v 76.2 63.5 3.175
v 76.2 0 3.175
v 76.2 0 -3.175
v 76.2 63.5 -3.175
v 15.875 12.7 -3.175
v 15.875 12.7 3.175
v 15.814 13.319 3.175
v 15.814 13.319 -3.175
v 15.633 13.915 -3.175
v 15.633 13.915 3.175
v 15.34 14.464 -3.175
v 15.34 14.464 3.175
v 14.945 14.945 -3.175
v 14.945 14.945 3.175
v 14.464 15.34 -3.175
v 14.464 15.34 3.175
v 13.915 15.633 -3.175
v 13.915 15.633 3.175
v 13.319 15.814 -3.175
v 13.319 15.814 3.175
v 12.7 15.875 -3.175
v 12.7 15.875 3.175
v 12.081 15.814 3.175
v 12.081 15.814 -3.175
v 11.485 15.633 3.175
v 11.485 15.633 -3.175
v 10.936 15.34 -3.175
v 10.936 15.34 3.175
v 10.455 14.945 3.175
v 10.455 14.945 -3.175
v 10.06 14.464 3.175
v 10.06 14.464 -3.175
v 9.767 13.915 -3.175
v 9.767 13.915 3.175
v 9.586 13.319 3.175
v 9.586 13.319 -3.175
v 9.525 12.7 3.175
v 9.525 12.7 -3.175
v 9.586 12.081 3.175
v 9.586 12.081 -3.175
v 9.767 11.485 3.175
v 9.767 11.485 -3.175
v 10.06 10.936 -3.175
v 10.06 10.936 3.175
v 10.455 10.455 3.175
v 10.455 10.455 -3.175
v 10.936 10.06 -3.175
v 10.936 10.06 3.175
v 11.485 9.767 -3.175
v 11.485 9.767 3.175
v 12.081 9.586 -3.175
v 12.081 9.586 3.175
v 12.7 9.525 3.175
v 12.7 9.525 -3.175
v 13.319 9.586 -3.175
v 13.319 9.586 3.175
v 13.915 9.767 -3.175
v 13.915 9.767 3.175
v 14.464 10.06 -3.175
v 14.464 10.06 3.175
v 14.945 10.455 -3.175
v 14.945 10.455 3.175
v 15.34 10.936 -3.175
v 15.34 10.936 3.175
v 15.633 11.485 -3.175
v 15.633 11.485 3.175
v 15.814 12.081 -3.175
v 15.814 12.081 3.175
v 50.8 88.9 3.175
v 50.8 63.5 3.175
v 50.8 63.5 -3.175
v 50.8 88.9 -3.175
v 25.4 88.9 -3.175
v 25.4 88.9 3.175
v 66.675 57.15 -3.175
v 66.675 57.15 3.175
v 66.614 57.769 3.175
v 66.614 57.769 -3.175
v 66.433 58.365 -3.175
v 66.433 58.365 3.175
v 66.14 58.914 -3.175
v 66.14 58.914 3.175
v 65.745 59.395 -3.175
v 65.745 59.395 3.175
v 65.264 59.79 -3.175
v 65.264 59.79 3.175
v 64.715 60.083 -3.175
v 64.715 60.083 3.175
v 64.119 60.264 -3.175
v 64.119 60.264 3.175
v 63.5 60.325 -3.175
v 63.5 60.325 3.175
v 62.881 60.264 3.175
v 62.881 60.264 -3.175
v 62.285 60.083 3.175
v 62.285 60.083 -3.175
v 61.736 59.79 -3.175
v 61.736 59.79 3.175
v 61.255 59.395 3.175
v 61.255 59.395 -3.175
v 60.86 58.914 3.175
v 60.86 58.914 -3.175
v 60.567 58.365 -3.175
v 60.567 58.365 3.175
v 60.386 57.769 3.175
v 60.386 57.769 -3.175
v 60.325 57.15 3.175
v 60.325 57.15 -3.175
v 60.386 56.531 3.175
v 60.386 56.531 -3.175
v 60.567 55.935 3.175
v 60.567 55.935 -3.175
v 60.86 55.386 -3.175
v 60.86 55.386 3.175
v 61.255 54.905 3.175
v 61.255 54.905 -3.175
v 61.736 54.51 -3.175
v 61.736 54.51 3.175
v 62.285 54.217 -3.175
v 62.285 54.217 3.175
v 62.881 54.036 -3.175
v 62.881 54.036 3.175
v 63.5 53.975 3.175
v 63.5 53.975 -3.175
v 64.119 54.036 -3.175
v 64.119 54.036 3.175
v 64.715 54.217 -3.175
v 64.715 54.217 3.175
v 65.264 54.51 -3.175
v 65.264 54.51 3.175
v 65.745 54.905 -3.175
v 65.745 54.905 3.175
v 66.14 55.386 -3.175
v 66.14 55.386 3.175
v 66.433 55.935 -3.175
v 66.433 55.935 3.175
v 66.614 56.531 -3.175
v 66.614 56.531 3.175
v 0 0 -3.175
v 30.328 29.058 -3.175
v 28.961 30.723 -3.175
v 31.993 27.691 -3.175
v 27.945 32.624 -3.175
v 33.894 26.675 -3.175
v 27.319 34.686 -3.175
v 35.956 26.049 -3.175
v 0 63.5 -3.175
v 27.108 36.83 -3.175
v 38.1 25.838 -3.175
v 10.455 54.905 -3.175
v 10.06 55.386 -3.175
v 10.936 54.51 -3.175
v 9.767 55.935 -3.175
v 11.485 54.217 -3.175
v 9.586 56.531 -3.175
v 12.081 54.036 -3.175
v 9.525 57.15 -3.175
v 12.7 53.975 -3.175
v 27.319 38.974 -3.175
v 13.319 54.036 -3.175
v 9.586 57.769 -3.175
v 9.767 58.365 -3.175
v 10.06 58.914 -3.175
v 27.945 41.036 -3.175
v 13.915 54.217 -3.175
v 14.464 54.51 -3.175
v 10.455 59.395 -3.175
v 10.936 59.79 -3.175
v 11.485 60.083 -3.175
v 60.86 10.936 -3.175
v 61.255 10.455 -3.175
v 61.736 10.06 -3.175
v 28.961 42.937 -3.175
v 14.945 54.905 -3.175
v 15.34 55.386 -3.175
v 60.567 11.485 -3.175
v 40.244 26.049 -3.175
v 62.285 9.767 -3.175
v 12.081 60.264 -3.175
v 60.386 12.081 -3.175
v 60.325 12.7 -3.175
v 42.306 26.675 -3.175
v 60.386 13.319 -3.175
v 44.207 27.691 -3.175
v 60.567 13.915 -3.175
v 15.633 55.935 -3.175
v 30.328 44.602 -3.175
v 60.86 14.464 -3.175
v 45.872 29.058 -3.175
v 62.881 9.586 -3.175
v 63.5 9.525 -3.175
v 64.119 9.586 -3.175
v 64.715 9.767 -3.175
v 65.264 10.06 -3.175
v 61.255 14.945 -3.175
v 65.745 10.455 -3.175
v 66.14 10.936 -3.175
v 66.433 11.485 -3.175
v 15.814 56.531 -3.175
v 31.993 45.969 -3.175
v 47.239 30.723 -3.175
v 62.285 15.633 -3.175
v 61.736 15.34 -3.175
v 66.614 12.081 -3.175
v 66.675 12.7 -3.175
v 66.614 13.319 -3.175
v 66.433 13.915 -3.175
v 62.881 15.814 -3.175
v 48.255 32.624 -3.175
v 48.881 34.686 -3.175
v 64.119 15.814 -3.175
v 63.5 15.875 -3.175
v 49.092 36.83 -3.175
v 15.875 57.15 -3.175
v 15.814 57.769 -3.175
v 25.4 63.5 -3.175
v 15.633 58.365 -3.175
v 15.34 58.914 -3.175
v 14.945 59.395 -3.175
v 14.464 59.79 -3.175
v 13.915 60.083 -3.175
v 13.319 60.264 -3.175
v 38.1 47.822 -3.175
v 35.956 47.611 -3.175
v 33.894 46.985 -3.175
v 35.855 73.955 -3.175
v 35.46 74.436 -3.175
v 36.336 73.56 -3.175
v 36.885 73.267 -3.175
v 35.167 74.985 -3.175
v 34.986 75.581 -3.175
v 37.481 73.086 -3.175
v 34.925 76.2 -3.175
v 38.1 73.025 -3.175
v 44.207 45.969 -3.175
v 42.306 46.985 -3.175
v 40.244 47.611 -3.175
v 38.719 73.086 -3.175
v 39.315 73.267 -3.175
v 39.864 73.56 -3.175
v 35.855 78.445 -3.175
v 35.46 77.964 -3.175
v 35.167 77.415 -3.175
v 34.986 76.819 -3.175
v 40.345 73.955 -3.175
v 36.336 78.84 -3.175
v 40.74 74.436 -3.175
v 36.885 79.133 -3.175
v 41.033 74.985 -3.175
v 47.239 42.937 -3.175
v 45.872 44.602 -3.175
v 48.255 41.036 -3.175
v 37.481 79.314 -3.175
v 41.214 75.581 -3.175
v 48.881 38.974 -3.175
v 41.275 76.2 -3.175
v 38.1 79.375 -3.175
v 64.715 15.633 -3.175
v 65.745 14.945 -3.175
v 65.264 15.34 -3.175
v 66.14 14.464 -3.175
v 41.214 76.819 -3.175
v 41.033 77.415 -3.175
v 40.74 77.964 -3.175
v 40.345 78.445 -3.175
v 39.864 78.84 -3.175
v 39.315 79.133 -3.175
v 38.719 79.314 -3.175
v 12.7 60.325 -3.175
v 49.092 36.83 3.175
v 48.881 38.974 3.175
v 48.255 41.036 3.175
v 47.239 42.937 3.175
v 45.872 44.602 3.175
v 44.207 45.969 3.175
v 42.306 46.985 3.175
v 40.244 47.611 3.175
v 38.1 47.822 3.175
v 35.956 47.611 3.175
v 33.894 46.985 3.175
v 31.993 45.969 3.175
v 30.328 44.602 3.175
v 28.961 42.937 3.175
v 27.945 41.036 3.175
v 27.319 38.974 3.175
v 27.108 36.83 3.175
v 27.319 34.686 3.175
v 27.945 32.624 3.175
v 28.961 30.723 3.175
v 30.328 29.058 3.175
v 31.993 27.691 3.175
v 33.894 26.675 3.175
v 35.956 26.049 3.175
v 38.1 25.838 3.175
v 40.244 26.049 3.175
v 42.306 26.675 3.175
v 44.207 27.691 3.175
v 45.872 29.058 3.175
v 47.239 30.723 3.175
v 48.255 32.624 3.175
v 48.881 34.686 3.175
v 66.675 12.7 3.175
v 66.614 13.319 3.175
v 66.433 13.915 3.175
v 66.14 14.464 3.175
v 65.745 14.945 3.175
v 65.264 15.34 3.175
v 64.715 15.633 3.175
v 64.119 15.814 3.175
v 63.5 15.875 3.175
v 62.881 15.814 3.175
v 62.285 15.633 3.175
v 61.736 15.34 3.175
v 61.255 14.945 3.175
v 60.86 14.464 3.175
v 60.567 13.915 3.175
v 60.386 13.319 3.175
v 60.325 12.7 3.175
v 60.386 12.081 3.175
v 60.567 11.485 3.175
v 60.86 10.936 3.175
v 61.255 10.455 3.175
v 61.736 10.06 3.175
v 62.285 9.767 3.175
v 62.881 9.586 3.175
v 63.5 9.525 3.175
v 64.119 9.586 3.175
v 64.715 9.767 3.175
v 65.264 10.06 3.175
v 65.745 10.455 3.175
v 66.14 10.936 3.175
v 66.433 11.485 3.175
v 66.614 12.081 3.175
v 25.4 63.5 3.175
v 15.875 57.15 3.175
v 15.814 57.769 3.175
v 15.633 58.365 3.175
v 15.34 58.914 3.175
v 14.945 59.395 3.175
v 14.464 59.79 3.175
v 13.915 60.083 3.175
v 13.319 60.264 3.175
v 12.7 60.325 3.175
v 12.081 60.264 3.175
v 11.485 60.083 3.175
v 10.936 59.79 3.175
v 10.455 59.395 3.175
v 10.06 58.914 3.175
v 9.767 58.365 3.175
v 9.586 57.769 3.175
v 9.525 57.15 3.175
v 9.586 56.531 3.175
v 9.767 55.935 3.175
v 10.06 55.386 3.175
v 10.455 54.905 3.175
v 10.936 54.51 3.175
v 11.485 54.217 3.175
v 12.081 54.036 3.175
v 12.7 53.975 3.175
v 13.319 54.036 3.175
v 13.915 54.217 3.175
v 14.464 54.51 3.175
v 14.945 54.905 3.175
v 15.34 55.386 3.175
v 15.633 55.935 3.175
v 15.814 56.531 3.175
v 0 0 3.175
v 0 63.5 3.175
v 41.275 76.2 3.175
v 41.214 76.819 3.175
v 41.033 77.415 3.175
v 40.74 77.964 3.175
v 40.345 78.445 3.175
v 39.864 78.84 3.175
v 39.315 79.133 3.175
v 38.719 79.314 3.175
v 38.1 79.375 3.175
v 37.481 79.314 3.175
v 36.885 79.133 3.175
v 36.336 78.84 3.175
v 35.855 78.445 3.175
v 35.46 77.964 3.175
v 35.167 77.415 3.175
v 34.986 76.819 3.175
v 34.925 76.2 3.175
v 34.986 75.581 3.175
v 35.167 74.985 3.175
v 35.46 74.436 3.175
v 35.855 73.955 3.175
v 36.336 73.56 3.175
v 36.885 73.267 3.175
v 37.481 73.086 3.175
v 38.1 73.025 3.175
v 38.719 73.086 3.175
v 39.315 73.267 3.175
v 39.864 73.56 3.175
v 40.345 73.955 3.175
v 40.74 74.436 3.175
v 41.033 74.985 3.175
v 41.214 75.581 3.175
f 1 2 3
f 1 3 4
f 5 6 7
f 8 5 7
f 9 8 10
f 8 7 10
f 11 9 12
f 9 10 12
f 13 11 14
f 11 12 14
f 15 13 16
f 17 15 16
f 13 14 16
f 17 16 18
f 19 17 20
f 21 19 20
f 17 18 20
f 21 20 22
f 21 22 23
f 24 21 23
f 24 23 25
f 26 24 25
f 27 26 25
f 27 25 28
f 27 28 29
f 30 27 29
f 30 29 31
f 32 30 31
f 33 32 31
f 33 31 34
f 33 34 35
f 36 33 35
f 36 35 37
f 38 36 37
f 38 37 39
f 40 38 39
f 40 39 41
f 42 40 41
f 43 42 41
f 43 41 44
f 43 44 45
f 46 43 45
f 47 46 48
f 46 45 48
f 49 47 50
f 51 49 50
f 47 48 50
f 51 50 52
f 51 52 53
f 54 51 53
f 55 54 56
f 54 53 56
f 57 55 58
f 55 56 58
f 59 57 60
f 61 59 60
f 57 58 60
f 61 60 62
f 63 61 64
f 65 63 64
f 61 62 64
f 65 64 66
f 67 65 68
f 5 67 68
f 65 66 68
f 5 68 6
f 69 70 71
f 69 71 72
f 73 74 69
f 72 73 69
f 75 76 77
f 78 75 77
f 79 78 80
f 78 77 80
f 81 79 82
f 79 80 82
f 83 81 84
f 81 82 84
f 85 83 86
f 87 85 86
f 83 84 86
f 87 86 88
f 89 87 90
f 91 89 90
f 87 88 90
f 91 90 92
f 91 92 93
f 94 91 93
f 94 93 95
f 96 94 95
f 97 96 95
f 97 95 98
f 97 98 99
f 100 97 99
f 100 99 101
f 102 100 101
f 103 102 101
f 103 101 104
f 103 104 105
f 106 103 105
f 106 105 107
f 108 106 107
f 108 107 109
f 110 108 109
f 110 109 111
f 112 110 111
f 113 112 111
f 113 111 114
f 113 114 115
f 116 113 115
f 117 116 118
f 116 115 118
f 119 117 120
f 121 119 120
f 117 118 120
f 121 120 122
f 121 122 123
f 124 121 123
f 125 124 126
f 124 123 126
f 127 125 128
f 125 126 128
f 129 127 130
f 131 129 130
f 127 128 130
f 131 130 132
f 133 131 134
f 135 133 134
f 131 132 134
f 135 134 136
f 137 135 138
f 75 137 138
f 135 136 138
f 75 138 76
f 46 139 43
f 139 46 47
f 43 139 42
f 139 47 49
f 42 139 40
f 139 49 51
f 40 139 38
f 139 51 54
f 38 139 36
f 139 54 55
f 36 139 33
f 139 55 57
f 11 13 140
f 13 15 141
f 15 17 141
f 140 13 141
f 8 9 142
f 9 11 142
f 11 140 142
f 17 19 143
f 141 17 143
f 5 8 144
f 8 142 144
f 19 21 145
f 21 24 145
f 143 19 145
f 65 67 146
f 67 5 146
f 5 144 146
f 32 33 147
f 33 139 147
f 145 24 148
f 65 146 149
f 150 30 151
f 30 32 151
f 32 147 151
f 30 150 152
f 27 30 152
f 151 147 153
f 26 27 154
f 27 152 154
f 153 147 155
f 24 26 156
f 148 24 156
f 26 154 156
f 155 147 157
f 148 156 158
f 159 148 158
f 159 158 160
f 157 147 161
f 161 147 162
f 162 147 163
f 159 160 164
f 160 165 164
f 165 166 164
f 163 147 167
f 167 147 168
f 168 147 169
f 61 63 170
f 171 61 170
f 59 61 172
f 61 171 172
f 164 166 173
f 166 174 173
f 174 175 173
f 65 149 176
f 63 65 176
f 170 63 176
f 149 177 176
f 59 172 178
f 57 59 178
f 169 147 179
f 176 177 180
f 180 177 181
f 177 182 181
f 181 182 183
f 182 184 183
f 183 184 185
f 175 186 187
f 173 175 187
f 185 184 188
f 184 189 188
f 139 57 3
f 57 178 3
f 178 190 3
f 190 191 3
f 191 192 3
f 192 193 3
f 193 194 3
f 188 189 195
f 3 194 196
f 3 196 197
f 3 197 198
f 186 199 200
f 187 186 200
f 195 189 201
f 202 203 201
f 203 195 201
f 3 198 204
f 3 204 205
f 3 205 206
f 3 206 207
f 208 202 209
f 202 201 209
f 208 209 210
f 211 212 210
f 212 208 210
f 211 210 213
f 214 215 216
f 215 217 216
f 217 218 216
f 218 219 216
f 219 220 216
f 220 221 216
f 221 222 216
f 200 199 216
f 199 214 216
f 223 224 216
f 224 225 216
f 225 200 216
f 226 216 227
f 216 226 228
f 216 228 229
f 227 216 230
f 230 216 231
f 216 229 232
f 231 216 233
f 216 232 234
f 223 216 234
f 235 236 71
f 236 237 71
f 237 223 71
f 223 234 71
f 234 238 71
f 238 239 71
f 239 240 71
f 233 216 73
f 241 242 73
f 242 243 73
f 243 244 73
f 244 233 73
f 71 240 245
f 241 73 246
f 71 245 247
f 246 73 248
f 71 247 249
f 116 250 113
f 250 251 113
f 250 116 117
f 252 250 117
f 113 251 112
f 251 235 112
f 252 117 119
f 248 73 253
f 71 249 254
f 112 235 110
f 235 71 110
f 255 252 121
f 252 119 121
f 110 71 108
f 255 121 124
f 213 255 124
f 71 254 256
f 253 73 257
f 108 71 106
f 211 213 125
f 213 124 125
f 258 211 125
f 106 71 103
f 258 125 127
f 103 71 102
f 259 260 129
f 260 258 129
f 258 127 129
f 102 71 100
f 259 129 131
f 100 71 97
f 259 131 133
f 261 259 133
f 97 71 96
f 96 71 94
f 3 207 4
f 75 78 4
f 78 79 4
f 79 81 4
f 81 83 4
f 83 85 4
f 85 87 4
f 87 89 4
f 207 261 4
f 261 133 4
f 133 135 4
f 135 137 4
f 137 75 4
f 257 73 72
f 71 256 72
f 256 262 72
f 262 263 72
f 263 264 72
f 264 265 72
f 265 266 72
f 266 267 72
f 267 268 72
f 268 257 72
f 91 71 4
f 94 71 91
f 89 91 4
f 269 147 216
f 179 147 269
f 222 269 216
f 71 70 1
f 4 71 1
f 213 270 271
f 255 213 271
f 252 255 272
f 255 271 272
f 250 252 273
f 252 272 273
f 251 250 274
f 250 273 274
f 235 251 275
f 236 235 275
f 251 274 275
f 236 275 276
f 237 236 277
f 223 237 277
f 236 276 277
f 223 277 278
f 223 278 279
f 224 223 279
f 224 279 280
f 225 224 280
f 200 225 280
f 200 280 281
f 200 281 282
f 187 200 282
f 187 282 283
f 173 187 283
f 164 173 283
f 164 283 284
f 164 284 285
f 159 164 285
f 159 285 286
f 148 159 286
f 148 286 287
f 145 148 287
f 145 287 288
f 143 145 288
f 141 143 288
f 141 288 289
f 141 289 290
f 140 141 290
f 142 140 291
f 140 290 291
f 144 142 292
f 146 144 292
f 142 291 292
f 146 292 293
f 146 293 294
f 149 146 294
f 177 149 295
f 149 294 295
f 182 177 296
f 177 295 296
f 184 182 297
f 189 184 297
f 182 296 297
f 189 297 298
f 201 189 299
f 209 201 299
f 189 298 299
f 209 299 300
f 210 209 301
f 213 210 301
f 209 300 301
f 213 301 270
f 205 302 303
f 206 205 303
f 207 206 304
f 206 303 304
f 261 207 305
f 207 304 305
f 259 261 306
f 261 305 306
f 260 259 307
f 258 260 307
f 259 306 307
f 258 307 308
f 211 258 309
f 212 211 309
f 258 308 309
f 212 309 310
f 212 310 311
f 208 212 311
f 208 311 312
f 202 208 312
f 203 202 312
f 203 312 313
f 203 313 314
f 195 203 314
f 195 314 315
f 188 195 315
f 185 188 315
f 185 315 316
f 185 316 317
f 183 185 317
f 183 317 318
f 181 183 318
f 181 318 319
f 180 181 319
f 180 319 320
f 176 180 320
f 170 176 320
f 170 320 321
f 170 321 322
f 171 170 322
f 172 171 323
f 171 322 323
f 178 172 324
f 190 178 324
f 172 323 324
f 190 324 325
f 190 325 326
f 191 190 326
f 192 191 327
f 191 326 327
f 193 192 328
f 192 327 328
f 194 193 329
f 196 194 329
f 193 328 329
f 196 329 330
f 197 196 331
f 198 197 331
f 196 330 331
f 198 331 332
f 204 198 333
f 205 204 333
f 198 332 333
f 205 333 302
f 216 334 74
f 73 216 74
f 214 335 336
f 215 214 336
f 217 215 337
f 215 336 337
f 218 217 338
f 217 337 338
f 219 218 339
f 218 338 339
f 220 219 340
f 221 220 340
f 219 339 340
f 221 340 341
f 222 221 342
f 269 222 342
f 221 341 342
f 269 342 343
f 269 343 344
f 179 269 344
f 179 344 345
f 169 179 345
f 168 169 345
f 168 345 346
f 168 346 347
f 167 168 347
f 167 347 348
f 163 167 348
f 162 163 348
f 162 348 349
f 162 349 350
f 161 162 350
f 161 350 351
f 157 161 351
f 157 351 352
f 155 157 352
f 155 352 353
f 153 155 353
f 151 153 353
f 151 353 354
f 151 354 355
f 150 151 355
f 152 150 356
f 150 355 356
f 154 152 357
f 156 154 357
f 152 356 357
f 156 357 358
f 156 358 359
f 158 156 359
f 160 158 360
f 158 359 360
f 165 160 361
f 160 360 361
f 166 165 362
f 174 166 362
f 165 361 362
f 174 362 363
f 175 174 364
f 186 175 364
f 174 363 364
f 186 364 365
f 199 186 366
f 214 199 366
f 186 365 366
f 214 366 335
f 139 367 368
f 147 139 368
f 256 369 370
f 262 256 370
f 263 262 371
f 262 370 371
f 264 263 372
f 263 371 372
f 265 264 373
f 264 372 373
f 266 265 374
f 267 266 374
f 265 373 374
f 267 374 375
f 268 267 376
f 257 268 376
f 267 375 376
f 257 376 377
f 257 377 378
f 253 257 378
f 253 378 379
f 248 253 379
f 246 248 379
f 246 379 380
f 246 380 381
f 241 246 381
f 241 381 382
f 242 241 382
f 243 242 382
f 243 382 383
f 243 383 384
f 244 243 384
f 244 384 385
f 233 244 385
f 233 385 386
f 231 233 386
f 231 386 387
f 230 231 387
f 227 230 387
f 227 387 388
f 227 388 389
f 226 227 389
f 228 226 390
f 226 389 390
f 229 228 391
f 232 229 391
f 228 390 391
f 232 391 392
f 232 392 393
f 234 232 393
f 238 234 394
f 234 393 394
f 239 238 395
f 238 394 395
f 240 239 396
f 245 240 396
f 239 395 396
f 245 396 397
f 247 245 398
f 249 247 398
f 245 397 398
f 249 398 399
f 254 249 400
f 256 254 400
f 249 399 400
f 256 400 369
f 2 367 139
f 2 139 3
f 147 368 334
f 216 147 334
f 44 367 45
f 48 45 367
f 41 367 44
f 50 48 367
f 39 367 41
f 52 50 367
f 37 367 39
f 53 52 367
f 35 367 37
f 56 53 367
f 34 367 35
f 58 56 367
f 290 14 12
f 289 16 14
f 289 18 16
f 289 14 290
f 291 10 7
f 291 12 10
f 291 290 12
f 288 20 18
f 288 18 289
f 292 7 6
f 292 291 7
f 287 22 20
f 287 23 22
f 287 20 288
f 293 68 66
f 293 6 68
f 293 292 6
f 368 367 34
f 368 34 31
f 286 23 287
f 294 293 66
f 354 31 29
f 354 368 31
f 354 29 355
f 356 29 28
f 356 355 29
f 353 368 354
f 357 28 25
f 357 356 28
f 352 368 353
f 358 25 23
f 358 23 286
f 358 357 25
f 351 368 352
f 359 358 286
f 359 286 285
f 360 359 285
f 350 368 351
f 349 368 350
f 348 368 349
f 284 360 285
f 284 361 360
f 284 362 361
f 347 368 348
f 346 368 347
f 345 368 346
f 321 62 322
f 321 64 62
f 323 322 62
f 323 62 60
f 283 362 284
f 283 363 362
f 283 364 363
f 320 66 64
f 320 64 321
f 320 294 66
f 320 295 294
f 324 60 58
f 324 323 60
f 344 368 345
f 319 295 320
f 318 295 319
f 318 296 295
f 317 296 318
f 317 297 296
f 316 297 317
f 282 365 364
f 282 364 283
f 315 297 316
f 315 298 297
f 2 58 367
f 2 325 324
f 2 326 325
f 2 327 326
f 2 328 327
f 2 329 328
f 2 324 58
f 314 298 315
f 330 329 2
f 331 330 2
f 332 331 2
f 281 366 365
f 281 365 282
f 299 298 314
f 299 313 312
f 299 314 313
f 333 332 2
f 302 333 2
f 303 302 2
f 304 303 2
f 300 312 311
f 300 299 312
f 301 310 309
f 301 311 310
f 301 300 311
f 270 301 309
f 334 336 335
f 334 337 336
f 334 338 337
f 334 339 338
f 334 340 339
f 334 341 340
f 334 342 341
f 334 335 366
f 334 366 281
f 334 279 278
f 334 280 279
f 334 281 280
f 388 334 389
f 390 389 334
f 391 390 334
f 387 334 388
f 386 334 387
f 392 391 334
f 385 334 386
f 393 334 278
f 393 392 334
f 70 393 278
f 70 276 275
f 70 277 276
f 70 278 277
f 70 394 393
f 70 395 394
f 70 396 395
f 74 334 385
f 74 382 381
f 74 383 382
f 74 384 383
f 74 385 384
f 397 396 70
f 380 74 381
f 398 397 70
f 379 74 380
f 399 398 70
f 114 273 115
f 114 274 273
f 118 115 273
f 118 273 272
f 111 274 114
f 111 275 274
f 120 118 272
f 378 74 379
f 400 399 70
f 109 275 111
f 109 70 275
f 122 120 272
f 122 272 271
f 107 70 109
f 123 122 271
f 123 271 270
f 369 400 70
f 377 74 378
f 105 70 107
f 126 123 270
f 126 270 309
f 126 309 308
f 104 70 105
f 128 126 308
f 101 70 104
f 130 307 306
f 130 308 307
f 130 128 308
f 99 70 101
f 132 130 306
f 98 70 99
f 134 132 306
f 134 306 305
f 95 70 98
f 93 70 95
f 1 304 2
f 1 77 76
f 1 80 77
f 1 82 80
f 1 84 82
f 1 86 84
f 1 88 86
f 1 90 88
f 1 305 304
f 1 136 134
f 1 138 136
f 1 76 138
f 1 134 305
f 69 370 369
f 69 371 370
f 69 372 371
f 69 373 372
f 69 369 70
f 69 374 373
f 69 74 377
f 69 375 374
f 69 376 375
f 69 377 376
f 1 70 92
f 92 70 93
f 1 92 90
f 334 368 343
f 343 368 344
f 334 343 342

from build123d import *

# Parameters (mm, degrees)
SKETCH1_W           = 76.2
SKETCH1_H           = 88.9
BOSS_EXTRUDE1_DEPTH = 3.175
SKETCH2_R           = 3.175
SKETCH2_R_2         = 10.99185
CUT_EXTRUDE1_DEPTH  = 7.35
CUT_EXTRUDE2_REACH  = 8.35
SKETCH5_R           = 3.175
SKETCH5_W           = 25.4
SKETCH5_H           = 25.4


with BuildPart() as part:
    # Sketch1 → Boss-Extrude1 (new body, symmetric)
    with BuildSketch(Plane.XY):
        with Locations((38.1, 44.45)):
            Rectangle(SKETCH1_W, SKETCH1_H)
    extrude(amount=BOSS_EXTRUDE1_DEPTH, both=True)

    # Sketch2 → Cut-Extrude1 (cut, through all)
    with BuildSketch(Plane.XY.offset(3.175)):
        with Locations((12.7, 76.2)):
            Circle(SKETCH2_R)
        with Locations((63.5, 76.2)):
            Circle(SKETCH2_R)
        with Locations((63.5, 12.7)):
            Circle(SKETCH2_R)
        with Locations((12.7, 12.7)):
            Circle(SKETCH2_R)
        with Locations((38.1, 36.83)):
            Circle(SKETCH2_R_2)
        with Locations((12.7, 57.15)):
            Circle(SKETCH2_R)
        with Locations((63.5, 57.15)):
            Circle(SKETCH2_R)
    extrude(amount=-CUT_EXTRUDE1_DEPTH, mode=Mode.SUBTRACT)

    # Sketch5 → Cut-Extrude2 (cut, up to next)
    with BuildSketch(Plane.XY.offset(3.175), mode=Mode.PRIVATE) as cut_extrude2_sk1:
        with Locations((38.1, 76.2)):
            Circle(SKETCH5_R)
    cut_extrude2_tool1 = extrude(cut_extrude2_sk1.sketch, amount=-CUT_EXTRUDE2_REACH, mode=Mode.PRIVATE) & part.part
    add(cut_extrude2_tool1.solids().sort_by_distance((38.1, 76.2, 3.175))[0], mode=Mode.SUBTRACT)
    # Sketch5 → Cut-Extrude2 (cut, up to next)
    with BuildSketch(Plane.XY.offset(3.175), mode=Mode.PRIVATE) as cut_extrude2_sk2:
        with Locations((63.5, 76.2)):
            Rectangle(SKETCH5_W, SKETCH5_H)
    cut_extrude2_tool2 = extrude(cut_extrude2_sk2.sketch, amount=-CUT_EXTRUDE2_REACH, mode=Mode.PRIVATE) & part.part
    add(cut_extrude2_tool2.solids().sort_by_distance((63.5, 76.2, 3.175))[0], mode=Mode.SUBTRACT)
    # Sketch5 → Cut-Extrude2 (cut, up to next)
    with BuildSketch(Plane.XY.offset(3.175), mode=Mode.PRIVATE) as cut_extrude2_sk3:
        with Locations((12.7, 76.2)):
            Rectangle(SKETCH5_W, SKETCH5_H)
    cut_extrude2_tool3 = extrude(cut_extrude2_sk3.sketch, amount=-CUT_EXTRUDE2_REACH, mode=Mode.PRIVATE) & part.part
    add(cut_extrude2_tool3.solids().sort_by_distance((12.7, 76.2, 3.175))[0], mode=Mode.SUBTRACT)


solid = part.part
